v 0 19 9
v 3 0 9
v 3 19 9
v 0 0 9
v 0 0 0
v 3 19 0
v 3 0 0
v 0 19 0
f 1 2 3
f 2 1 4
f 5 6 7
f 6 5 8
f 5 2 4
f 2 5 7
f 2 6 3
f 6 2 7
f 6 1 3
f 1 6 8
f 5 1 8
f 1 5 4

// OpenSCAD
// Generated by SolidPython 1.0.1 on 2020-07-29 00:46:54


cube(size = [3, 19, 9]);
/***********************************************
*********      SolidPython code:      **********
************************************************
 
# import packages: SolidPython
from solid import *
from solid.utils import *
from itertools import chain, combinations, permutations


class Resize:

    def __init__(self, scad_file):
        self.scad_file = scad_file
        #self.scad_file = import_scad(scad_file)
        # cone/cylinder param:
        self.r1 = 0
        self.r2 = 0
        self.h = 0
        # rectangular prism param:
        self.w = 0
        self.l = 0
        # ellipse param:
        self.r = 0

    # import OpenScad code (file name corresponds to shape)


    # classify shape + parameters
    def assign(self, param1, param2, param3):
        if self.scad_file == 'cone.scad':
            self.r1 = param1
            self.r2 = param2
            self.h = param3
        elif self.scad_file == 'cylinder.scad':
            self.r1 = param1
            self.r2 = param2
            self.h = param3
        elif self.scad_file == 'rectangularPrism.scad':
            self.h = param1
            self.l = param2
            self.w = param3
        else:
            self.r = param1
            self.h = param2

    # resize parameters
    def iterate(self):
        x = range(3, 20, 2)
        i = 1
        if self.scad_file == 'cone.scad':
            tempList = list(permutations(x, 2))
            for temp in tempList:
                param1 = temp[0]
                param2 = temp[1]
                filepath = 'produced_scad_files/' + 'cone' + str(param1) + '_' + str(param2) + '_' + '.scad'
                scad_render_to_file(cylinder(h=param1, r1=param2, r2=0), filepath)

        elif self.scad_file == 'cylinder.scad':
            tempList = list(permutations(x, 3))
            for temp in tempList:
                param1 = temp[0]
                param2 = temp[1]
                filepath = 'produced_scad_files/' + 'cylinder' + str(param1) + '_' + str(param2) + '_' + '.scad'
                scad_render_to_file(cylinder(h=param1, r1=param2, r2=param2), filepath)

        elif self.scad_file == 'rectangularPrism.scad':
            tempList = list(permutations(x, 3))
            for temp in tempList:
                param1 = temp[0]
                param2 = temp[1]
                param3 = temp[2]
                filepath = 'produced_scad_files/' + 'rectangularPrism' + str(param1) + '_' + str(param2) + '_' + str(
                    param3) + '.scad'
                scad_render_to_file(cube(size=(param1, param2, param3)), filepath)

        elif self.scad_file == 'ellipse.scad':
            tempList = list(permutations(x, 4))
            for temp in tempList:
                param1 = temp[0]
                param2 = temp[1]
                param3 = temp[2]
                param4 = temp[3]
                filepath = 'produced_scad_files/' + 'ellipse' + str(param1) + '_' + str(param2) + '_' + str(param3) + '_' + str(param4) + '.scad'
                scad_render_to_file(scale([param1, param2, param3])(sphere(r=param4)), filepath)

    def render_to_scadfile(self):
        scad_render_to_file(scad, 'example.scad') 
 
************************************************/
